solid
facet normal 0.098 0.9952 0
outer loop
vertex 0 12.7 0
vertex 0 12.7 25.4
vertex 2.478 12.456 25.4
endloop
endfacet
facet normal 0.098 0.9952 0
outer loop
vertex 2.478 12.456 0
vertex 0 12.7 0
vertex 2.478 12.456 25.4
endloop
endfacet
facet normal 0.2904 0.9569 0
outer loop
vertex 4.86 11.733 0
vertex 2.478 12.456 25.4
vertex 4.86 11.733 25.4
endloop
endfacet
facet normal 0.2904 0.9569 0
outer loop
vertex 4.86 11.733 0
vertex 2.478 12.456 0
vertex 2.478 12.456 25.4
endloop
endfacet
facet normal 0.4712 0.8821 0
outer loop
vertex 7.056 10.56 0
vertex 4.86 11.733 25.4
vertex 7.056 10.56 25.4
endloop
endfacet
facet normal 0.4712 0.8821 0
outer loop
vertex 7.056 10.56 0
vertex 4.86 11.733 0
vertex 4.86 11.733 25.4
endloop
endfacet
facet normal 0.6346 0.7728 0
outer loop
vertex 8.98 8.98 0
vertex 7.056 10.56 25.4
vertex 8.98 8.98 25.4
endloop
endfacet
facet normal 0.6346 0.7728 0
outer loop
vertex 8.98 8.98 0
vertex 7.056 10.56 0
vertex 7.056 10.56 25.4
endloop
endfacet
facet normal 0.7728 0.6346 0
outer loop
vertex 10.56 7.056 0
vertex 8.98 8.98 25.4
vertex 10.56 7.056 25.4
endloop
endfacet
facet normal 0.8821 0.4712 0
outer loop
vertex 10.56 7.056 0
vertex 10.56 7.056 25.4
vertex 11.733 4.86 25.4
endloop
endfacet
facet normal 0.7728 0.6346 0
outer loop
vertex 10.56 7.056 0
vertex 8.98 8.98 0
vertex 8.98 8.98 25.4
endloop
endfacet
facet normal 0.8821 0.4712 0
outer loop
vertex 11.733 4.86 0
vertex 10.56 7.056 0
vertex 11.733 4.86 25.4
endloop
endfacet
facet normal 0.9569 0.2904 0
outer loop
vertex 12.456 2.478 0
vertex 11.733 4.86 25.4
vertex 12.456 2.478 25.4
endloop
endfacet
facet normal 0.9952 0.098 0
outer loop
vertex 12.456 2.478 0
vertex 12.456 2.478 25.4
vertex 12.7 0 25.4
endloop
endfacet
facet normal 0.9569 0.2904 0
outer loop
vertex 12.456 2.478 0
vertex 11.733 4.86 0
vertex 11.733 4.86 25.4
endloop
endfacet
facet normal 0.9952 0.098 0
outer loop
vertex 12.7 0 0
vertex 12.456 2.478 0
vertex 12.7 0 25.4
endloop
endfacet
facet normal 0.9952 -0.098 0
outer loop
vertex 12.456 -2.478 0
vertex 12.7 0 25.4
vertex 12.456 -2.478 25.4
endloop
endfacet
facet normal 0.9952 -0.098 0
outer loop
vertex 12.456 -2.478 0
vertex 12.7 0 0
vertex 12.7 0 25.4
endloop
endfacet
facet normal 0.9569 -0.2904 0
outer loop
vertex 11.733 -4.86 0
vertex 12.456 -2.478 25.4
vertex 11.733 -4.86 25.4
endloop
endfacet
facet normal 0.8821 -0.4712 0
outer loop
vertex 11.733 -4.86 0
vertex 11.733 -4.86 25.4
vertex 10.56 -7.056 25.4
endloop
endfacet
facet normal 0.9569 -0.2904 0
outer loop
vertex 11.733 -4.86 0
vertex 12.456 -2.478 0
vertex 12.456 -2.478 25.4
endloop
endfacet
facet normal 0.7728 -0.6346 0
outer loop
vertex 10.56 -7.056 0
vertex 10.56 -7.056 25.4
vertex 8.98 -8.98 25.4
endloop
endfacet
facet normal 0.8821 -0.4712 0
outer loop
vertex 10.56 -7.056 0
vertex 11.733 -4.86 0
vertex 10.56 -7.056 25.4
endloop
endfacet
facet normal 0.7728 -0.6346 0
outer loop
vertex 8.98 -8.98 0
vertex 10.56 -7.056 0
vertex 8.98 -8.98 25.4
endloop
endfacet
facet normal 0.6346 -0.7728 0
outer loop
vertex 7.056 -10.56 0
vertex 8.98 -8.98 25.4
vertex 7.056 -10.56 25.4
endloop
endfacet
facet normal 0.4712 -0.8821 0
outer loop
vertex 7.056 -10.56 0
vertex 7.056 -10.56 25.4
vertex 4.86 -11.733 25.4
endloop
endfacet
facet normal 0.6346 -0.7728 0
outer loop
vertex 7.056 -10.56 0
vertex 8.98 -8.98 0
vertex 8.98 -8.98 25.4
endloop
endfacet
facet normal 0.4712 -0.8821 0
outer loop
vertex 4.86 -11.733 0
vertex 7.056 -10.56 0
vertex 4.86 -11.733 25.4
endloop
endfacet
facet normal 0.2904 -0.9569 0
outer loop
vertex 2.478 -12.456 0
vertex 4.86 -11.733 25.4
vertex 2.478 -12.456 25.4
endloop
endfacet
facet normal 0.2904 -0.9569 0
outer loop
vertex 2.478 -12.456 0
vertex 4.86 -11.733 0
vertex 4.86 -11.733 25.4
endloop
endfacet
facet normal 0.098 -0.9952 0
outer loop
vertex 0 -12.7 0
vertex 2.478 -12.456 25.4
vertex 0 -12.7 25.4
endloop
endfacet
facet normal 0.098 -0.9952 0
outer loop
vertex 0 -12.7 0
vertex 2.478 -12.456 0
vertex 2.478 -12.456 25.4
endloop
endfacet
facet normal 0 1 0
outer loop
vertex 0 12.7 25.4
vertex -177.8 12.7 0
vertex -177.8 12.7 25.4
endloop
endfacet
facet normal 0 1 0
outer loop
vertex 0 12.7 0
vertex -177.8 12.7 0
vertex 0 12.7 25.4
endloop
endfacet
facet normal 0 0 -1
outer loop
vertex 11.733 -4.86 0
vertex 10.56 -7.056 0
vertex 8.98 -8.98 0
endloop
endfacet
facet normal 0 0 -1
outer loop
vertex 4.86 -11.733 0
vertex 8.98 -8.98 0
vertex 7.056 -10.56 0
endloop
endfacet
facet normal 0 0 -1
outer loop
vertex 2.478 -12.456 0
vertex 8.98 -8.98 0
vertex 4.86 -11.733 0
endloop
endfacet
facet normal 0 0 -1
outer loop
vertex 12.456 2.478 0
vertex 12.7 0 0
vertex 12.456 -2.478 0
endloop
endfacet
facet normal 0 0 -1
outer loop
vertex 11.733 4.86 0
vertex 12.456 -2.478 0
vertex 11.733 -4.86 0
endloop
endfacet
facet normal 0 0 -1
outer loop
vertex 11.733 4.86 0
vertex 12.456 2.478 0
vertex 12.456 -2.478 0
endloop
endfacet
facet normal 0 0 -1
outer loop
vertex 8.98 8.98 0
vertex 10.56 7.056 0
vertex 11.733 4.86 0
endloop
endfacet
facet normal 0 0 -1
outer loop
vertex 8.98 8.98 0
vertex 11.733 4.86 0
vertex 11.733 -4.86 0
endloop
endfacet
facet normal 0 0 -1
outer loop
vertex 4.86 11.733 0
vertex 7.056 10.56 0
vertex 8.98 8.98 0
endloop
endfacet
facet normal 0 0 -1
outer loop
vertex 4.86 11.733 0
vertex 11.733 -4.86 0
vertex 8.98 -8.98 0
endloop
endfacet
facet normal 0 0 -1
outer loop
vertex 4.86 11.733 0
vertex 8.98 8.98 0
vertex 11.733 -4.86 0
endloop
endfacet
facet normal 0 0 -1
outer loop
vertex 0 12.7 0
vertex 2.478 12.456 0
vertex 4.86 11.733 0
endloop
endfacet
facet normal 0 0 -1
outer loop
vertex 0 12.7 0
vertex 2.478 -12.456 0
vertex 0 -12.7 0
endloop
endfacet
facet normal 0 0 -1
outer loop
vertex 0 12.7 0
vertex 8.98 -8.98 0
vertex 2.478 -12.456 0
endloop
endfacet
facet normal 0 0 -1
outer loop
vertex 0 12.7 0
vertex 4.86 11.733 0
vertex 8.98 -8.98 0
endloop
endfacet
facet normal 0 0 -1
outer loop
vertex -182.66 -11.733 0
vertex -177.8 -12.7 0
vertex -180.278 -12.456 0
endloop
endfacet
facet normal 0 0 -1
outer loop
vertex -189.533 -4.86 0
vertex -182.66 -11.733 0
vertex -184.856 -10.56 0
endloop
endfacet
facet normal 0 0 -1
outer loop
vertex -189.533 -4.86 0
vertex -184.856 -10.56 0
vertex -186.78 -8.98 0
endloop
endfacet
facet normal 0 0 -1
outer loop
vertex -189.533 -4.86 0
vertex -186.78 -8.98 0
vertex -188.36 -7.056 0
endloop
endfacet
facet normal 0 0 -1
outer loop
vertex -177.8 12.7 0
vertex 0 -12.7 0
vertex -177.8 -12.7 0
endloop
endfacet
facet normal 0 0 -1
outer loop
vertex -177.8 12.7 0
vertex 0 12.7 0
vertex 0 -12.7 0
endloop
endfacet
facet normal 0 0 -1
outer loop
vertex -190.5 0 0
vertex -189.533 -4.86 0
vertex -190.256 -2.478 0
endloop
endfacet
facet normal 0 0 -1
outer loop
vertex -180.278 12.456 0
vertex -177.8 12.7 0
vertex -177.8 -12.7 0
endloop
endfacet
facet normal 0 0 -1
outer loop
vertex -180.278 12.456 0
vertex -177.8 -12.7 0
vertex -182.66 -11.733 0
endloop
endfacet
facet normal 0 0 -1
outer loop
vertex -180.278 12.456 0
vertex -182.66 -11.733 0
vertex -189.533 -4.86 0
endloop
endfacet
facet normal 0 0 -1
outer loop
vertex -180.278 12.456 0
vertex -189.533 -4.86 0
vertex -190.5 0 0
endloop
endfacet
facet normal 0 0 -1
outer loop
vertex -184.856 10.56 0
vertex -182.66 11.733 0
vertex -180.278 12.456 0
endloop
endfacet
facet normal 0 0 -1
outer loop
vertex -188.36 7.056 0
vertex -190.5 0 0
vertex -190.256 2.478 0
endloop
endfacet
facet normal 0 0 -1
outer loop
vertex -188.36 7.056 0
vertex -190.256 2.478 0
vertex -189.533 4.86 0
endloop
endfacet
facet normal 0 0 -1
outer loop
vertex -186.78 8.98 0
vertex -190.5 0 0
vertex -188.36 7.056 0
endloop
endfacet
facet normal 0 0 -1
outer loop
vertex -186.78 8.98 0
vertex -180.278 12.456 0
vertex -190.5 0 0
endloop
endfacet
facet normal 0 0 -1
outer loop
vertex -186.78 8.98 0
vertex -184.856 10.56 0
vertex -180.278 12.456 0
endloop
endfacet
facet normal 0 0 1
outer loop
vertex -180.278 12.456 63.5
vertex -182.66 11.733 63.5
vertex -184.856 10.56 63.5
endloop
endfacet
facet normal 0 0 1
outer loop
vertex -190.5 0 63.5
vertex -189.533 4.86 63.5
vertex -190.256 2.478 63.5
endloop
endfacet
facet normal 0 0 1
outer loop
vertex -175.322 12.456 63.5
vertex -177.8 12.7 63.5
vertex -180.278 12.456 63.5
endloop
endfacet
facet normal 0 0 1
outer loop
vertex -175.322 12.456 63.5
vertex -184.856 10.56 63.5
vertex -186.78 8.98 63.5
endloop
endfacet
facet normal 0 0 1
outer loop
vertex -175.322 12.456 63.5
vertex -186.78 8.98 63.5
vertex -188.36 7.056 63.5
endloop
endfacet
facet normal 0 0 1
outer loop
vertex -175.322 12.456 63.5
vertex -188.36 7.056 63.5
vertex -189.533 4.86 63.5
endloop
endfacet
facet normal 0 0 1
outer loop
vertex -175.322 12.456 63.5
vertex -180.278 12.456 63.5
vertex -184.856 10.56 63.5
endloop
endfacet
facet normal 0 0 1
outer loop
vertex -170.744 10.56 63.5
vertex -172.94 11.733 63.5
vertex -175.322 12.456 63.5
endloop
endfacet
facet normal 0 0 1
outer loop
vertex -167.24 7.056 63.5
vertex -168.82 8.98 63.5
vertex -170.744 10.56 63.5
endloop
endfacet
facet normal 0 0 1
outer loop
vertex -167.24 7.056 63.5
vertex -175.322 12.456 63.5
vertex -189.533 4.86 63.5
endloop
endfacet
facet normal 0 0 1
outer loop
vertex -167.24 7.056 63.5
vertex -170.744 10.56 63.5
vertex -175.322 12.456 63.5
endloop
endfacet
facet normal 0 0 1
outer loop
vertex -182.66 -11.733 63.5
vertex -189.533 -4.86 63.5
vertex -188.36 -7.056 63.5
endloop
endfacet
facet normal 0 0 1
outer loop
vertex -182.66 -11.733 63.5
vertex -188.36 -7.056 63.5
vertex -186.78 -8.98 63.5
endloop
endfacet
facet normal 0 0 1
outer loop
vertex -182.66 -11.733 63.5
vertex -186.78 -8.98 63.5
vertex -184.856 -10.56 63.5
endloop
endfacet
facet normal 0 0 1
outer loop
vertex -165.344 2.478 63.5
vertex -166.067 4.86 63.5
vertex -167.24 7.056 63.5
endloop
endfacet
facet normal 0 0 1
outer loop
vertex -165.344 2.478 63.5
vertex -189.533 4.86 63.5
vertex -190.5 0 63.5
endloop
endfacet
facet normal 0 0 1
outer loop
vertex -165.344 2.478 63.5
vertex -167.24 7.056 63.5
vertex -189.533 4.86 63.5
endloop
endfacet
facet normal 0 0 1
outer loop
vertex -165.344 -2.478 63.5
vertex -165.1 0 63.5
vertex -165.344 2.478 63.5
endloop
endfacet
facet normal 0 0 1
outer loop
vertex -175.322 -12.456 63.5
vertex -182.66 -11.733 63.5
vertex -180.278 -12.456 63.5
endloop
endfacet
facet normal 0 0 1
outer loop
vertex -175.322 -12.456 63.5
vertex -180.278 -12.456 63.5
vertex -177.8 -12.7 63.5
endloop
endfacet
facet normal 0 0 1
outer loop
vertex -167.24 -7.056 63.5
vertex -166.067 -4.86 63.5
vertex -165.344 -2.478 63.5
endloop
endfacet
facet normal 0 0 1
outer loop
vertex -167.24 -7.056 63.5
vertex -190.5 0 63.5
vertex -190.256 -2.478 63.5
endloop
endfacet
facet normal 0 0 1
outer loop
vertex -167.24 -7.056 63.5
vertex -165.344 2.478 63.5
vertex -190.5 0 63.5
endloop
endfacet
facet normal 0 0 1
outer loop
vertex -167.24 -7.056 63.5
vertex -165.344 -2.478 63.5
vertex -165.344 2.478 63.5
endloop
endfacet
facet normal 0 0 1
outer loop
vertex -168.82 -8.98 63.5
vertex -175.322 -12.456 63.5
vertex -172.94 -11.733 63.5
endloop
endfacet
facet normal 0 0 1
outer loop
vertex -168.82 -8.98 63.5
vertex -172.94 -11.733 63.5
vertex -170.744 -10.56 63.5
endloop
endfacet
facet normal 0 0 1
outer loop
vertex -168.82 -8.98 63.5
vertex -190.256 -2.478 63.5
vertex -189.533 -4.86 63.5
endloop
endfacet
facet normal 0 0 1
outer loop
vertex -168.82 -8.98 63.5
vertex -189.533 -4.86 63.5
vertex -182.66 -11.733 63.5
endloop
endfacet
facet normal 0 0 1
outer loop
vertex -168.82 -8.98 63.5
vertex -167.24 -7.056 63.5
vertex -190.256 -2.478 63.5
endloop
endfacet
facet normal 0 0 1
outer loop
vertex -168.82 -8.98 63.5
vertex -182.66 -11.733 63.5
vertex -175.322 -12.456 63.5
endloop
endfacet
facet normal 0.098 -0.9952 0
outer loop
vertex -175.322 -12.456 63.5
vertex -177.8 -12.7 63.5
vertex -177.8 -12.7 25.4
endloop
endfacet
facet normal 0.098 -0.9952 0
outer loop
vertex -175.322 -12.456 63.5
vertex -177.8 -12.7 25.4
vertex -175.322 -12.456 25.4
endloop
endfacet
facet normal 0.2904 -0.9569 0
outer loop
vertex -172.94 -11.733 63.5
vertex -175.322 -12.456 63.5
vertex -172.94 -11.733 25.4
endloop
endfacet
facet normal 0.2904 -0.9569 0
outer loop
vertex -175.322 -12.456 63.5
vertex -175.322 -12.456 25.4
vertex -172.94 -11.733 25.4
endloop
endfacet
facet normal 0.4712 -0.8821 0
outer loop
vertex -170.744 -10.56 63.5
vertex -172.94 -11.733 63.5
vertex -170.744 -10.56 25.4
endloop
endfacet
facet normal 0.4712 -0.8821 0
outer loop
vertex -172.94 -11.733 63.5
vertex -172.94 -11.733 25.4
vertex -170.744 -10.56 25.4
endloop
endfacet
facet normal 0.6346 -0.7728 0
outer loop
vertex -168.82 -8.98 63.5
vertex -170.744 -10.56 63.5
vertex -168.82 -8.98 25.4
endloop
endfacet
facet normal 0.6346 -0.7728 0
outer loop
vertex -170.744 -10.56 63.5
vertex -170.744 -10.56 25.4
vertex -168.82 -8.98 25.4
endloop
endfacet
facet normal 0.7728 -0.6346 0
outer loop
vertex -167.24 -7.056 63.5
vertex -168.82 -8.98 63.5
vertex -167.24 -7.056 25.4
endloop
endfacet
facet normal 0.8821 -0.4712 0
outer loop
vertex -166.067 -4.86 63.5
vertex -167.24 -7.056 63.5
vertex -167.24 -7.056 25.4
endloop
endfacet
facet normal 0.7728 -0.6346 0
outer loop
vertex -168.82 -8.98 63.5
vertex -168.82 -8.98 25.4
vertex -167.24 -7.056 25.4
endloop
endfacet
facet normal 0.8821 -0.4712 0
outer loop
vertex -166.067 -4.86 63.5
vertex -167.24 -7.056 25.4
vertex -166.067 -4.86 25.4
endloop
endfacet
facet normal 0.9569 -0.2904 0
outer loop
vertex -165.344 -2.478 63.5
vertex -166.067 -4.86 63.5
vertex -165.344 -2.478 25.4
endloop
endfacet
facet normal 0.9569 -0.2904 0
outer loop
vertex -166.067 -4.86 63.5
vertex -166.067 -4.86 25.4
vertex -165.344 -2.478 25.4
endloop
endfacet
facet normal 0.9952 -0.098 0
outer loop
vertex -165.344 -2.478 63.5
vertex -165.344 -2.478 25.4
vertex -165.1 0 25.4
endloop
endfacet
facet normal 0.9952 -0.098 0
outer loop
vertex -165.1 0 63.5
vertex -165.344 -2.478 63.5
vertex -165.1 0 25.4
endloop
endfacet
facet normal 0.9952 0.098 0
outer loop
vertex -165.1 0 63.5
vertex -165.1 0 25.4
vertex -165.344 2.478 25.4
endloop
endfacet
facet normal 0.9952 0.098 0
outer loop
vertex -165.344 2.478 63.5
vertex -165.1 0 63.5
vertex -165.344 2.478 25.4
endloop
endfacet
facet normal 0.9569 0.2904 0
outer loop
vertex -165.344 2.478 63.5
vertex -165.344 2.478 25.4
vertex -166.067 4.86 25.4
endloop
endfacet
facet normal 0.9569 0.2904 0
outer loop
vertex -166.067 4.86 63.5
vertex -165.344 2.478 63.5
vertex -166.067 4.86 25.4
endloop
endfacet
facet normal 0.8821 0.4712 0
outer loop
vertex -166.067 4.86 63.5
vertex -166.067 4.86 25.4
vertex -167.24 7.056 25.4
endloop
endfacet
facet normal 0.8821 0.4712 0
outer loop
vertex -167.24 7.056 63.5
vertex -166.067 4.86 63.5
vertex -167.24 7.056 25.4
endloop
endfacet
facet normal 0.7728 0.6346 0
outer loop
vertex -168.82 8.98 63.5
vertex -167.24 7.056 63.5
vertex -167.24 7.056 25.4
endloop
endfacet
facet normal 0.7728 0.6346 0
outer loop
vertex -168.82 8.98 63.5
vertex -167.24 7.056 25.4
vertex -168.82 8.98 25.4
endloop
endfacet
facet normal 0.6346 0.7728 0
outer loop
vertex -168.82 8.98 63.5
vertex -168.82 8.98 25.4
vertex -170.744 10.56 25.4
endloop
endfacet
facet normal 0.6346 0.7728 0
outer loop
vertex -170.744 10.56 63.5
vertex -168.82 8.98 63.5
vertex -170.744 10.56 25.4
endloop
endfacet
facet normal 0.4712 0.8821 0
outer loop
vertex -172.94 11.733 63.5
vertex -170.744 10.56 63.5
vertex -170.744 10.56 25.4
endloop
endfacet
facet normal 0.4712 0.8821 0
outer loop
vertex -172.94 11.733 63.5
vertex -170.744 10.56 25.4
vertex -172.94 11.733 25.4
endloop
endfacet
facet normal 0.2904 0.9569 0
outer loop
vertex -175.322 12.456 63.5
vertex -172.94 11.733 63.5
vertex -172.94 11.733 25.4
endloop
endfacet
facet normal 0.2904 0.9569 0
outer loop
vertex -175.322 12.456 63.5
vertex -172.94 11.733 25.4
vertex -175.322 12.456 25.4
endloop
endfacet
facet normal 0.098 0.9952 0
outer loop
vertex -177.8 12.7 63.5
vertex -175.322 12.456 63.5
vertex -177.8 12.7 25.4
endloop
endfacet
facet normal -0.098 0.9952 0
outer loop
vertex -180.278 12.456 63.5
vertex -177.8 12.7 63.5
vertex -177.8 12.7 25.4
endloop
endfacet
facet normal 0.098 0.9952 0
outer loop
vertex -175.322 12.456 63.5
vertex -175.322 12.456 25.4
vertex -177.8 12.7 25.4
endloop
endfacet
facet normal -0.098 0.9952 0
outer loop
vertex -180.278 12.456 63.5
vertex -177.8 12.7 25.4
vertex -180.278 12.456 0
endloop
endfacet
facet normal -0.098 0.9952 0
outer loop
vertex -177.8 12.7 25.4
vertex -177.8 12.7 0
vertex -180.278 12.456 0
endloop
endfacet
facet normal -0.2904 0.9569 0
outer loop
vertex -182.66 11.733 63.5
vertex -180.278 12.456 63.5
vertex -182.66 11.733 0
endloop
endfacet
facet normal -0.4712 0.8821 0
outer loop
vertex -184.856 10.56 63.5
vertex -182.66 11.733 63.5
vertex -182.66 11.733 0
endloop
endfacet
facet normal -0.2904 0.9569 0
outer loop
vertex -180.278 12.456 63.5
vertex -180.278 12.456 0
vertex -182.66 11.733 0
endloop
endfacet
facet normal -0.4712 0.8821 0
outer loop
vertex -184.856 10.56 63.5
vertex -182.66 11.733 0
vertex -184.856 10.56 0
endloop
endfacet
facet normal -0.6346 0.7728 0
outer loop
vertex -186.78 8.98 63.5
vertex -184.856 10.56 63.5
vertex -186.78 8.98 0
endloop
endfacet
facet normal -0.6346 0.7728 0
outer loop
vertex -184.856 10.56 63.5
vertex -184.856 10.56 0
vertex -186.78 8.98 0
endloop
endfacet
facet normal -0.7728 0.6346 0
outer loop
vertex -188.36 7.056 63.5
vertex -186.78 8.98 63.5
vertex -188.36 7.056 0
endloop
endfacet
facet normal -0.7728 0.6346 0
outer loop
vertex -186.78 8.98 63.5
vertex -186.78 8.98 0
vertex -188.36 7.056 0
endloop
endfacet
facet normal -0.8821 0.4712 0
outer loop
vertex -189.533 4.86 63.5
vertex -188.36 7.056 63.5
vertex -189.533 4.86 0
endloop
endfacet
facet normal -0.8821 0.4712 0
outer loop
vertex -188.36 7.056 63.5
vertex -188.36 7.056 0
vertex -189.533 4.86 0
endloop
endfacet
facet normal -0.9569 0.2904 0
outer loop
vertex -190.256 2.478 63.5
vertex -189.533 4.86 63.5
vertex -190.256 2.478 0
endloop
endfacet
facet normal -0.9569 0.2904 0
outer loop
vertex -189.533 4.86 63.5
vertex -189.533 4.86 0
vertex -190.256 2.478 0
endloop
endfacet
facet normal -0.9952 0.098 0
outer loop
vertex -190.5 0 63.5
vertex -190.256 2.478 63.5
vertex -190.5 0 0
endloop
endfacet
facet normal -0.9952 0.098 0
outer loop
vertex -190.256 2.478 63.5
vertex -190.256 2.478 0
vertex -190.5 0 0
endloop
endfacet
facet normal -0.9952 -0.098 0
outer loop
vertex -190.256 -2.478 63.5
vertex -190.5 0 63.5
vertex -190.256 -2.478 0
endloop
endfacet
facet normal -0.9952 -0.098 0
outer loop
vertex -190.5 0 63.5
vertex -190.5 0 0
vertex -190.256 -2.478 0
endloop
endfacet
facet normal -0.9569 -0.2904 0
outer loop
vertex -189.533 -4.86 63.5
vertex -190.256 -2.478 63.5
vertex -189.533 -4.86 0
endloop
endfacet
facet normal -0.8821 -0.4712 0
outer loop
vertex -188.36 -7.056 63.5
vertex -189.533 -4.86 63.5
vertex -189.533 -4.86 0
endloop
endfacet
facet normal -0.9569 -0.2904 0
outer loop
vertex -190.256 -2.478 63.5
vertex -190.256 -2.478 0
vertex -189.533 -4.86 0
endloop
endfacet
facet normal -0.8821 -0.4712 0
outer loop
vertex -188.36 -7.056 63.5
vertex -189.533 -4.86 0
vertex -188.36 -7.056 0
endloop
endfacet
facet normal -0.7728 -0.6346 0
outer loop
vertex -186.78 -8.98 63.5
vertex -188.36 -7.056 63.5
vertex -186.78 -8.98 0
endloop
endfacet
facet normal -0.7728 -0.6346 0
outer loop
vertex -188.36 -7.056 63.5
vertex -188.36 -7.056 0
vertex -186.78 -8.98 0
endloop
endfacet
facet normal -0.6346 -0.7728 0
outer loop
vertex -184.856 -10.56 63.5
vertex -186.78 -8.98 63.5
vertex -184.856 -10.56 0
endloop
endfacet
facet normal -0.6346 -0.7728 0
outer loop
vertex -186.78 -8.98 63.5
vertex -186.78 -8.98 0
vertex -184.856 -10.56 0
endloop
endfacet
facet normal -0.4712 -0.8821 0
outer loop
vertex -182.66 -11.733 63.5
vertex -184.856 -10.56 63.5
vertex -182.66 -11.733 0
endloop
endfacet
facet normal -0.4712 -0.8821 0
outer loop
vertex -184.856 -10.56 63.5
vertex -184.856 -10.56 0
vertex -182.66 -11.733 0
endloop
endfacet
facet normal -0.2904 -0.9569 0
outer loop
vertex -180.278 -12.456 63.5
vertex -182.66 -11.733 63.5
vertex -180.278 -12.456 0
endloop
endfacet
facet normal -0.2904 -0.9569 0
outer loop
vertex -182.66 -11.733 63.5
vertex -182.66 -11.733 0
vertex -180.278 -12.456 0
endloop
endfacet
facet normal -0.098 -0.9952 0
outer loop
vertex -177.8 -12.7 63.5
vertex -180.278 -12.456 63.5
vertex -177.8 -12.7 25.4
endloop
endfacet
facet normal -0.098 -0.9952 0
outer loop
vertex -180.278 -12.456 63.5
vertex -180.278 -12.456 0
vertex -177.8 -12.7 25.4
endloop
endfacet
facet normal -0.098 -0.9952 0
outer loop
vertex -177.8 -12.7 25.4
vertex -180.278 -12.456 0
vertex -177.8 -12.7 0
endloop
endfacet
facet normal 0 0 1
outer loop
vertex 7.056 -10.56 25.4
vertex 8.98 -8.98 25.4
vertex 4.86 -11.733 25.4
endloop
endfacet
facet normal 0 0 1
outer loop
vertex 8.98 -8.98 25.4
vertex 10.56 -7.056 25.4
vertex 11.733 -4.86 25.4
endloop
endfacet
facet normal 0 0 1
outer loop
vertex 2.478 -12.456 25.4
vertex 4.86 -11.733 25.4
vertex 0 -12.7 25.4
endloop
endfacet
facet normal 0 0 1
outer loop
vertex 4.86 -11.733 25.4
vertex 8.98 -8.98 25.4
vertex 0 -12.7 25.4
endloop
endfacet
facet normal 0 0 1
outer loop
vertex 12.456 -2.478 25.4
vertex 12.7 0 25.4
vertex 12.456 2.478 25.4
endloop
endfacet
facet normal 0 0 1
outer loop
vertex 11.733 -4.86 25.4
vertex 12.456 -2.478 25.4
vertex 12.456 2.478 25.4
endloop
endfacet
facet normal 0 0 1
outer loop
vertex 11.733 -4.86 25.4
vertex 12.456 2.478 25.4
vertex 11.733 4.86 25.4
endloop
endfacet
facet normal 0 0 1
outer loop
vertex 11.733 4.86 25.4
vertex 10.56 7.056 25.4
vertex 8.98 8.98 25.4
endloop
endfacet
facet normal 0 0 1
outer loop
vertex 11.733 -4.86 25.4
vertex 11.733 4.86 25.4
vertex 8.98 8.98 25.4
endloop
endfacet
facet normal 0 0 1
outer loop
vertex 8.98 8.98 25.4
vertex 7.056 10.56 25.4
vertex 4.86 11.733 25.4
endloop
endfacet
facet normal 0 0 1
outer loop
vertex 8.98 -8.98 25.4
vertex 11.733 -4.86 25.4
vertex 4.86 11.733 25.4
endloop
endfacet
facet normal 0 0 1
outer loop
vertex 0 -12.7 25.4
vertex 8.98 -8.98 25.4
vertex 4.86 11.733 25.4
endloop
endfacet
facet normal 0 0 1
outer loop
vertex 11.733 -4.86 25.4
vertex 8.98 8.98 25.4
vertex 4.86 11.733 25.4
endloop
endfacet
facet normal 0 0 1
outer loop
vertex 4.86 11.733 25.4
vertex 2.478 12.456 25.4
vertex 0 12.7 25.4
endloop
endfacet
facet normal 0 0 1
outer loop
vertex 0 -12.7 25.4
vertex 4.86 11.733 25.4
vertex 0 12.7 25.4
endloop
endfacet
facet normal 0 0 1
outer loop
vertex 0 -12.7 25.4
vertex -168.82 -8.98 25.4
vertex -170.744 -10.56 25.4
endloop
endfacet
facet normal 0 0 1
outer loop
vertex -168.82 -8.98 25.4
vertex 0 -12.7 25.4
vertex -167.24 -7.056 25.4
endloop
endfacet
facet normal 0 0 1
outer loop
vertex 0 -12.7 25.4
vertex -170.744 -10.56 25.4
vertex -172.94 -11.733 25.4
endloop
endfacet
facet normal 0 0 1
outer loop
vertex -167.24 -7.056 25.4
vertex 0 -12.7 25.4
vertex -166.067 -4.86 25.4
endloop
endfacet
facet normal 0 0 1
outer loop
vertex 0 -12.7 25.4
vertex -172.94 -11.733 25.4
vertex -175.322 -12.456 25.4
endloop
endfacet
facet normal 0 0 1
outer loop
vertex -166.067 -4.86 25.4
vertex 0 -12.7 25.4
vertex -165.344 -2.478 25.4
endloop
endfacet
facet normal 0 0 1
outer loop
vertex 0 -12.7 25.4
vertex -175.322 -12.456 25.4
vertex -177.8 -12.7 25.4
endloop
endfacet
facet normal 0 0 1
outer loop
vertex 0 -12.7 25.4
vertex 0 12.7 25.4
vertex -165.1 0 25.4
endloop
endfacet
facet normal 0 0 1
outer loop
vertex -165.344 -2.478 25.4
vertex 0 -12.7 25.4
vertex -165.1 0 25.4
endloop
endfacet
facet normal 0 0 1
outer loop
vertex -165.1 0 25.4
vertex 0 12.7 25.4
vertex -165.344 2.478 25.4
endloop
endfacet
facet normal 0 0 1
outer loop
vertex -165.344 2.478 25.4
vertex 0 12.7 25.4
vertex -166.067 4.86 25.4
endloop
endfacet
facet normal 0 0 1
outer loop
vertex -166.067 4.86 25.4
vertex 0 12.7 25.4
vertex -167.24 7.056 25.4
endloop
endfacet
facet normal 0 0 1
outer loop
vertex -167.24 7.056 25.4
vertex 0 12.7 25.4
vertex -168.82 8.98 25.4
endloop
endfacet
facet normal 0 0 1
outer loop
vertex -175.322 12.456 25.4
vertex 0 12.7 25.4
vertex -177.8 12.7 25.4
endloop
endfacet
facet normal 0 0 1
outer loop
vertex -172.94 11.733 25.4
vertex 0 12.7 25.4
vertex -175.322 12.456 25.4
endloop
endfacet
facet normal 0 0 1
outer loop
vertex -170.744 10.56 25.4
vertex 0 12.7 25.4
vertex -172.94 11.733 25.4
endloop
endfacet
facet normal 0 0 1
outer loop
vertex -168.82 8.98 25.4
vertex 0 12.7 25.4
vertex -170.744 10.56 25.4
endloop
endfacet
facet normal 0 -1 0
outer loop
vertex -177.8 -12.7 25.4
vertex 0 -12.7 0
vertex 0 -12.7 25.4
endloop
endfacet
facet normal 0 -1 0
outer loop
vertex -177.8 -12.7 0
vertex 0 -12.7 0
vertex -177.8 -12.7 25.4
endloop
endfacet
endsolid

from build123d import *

# Parameters (mm, degrees)
BOSS_EXTRUDE1_DEPTH = 25.4
SKETCH2_R           = 12.7
BOSS_EXTRUDE2_DEPTH = 38.1


with BuildPart() as part:
    # Sketch1 → Boss-Extrude1 (new body)
    with BuildSketch(Plane.XY):
        with BuildLine():
            Line((0, -12.7), (-177.8, -12.7))
            ThreePointArc((-177.8, -12.7), (-190.5, 0), (-177.8, 12.7))
            Line((-177.8, 12.7), (0, 12.7))
            ThreePointArc((0, 12.7), (12.7, 0), (0, -12.7))
        make_face()
    extrude(amount=BOSS_EXTRUDE1_DEPTH)

    # Sketch2 → Boss-Extrude2 (add)
    with BuildSketch(Plane.XY.offset(25.4)):
        with Locations(Location((-177.8, 0, 0), (0, 0, 270))):
            Circle(SKETCH2_R)
    extrude(amount=BOSS_EXTRUDE2_DEPTH)


solid = part.part
